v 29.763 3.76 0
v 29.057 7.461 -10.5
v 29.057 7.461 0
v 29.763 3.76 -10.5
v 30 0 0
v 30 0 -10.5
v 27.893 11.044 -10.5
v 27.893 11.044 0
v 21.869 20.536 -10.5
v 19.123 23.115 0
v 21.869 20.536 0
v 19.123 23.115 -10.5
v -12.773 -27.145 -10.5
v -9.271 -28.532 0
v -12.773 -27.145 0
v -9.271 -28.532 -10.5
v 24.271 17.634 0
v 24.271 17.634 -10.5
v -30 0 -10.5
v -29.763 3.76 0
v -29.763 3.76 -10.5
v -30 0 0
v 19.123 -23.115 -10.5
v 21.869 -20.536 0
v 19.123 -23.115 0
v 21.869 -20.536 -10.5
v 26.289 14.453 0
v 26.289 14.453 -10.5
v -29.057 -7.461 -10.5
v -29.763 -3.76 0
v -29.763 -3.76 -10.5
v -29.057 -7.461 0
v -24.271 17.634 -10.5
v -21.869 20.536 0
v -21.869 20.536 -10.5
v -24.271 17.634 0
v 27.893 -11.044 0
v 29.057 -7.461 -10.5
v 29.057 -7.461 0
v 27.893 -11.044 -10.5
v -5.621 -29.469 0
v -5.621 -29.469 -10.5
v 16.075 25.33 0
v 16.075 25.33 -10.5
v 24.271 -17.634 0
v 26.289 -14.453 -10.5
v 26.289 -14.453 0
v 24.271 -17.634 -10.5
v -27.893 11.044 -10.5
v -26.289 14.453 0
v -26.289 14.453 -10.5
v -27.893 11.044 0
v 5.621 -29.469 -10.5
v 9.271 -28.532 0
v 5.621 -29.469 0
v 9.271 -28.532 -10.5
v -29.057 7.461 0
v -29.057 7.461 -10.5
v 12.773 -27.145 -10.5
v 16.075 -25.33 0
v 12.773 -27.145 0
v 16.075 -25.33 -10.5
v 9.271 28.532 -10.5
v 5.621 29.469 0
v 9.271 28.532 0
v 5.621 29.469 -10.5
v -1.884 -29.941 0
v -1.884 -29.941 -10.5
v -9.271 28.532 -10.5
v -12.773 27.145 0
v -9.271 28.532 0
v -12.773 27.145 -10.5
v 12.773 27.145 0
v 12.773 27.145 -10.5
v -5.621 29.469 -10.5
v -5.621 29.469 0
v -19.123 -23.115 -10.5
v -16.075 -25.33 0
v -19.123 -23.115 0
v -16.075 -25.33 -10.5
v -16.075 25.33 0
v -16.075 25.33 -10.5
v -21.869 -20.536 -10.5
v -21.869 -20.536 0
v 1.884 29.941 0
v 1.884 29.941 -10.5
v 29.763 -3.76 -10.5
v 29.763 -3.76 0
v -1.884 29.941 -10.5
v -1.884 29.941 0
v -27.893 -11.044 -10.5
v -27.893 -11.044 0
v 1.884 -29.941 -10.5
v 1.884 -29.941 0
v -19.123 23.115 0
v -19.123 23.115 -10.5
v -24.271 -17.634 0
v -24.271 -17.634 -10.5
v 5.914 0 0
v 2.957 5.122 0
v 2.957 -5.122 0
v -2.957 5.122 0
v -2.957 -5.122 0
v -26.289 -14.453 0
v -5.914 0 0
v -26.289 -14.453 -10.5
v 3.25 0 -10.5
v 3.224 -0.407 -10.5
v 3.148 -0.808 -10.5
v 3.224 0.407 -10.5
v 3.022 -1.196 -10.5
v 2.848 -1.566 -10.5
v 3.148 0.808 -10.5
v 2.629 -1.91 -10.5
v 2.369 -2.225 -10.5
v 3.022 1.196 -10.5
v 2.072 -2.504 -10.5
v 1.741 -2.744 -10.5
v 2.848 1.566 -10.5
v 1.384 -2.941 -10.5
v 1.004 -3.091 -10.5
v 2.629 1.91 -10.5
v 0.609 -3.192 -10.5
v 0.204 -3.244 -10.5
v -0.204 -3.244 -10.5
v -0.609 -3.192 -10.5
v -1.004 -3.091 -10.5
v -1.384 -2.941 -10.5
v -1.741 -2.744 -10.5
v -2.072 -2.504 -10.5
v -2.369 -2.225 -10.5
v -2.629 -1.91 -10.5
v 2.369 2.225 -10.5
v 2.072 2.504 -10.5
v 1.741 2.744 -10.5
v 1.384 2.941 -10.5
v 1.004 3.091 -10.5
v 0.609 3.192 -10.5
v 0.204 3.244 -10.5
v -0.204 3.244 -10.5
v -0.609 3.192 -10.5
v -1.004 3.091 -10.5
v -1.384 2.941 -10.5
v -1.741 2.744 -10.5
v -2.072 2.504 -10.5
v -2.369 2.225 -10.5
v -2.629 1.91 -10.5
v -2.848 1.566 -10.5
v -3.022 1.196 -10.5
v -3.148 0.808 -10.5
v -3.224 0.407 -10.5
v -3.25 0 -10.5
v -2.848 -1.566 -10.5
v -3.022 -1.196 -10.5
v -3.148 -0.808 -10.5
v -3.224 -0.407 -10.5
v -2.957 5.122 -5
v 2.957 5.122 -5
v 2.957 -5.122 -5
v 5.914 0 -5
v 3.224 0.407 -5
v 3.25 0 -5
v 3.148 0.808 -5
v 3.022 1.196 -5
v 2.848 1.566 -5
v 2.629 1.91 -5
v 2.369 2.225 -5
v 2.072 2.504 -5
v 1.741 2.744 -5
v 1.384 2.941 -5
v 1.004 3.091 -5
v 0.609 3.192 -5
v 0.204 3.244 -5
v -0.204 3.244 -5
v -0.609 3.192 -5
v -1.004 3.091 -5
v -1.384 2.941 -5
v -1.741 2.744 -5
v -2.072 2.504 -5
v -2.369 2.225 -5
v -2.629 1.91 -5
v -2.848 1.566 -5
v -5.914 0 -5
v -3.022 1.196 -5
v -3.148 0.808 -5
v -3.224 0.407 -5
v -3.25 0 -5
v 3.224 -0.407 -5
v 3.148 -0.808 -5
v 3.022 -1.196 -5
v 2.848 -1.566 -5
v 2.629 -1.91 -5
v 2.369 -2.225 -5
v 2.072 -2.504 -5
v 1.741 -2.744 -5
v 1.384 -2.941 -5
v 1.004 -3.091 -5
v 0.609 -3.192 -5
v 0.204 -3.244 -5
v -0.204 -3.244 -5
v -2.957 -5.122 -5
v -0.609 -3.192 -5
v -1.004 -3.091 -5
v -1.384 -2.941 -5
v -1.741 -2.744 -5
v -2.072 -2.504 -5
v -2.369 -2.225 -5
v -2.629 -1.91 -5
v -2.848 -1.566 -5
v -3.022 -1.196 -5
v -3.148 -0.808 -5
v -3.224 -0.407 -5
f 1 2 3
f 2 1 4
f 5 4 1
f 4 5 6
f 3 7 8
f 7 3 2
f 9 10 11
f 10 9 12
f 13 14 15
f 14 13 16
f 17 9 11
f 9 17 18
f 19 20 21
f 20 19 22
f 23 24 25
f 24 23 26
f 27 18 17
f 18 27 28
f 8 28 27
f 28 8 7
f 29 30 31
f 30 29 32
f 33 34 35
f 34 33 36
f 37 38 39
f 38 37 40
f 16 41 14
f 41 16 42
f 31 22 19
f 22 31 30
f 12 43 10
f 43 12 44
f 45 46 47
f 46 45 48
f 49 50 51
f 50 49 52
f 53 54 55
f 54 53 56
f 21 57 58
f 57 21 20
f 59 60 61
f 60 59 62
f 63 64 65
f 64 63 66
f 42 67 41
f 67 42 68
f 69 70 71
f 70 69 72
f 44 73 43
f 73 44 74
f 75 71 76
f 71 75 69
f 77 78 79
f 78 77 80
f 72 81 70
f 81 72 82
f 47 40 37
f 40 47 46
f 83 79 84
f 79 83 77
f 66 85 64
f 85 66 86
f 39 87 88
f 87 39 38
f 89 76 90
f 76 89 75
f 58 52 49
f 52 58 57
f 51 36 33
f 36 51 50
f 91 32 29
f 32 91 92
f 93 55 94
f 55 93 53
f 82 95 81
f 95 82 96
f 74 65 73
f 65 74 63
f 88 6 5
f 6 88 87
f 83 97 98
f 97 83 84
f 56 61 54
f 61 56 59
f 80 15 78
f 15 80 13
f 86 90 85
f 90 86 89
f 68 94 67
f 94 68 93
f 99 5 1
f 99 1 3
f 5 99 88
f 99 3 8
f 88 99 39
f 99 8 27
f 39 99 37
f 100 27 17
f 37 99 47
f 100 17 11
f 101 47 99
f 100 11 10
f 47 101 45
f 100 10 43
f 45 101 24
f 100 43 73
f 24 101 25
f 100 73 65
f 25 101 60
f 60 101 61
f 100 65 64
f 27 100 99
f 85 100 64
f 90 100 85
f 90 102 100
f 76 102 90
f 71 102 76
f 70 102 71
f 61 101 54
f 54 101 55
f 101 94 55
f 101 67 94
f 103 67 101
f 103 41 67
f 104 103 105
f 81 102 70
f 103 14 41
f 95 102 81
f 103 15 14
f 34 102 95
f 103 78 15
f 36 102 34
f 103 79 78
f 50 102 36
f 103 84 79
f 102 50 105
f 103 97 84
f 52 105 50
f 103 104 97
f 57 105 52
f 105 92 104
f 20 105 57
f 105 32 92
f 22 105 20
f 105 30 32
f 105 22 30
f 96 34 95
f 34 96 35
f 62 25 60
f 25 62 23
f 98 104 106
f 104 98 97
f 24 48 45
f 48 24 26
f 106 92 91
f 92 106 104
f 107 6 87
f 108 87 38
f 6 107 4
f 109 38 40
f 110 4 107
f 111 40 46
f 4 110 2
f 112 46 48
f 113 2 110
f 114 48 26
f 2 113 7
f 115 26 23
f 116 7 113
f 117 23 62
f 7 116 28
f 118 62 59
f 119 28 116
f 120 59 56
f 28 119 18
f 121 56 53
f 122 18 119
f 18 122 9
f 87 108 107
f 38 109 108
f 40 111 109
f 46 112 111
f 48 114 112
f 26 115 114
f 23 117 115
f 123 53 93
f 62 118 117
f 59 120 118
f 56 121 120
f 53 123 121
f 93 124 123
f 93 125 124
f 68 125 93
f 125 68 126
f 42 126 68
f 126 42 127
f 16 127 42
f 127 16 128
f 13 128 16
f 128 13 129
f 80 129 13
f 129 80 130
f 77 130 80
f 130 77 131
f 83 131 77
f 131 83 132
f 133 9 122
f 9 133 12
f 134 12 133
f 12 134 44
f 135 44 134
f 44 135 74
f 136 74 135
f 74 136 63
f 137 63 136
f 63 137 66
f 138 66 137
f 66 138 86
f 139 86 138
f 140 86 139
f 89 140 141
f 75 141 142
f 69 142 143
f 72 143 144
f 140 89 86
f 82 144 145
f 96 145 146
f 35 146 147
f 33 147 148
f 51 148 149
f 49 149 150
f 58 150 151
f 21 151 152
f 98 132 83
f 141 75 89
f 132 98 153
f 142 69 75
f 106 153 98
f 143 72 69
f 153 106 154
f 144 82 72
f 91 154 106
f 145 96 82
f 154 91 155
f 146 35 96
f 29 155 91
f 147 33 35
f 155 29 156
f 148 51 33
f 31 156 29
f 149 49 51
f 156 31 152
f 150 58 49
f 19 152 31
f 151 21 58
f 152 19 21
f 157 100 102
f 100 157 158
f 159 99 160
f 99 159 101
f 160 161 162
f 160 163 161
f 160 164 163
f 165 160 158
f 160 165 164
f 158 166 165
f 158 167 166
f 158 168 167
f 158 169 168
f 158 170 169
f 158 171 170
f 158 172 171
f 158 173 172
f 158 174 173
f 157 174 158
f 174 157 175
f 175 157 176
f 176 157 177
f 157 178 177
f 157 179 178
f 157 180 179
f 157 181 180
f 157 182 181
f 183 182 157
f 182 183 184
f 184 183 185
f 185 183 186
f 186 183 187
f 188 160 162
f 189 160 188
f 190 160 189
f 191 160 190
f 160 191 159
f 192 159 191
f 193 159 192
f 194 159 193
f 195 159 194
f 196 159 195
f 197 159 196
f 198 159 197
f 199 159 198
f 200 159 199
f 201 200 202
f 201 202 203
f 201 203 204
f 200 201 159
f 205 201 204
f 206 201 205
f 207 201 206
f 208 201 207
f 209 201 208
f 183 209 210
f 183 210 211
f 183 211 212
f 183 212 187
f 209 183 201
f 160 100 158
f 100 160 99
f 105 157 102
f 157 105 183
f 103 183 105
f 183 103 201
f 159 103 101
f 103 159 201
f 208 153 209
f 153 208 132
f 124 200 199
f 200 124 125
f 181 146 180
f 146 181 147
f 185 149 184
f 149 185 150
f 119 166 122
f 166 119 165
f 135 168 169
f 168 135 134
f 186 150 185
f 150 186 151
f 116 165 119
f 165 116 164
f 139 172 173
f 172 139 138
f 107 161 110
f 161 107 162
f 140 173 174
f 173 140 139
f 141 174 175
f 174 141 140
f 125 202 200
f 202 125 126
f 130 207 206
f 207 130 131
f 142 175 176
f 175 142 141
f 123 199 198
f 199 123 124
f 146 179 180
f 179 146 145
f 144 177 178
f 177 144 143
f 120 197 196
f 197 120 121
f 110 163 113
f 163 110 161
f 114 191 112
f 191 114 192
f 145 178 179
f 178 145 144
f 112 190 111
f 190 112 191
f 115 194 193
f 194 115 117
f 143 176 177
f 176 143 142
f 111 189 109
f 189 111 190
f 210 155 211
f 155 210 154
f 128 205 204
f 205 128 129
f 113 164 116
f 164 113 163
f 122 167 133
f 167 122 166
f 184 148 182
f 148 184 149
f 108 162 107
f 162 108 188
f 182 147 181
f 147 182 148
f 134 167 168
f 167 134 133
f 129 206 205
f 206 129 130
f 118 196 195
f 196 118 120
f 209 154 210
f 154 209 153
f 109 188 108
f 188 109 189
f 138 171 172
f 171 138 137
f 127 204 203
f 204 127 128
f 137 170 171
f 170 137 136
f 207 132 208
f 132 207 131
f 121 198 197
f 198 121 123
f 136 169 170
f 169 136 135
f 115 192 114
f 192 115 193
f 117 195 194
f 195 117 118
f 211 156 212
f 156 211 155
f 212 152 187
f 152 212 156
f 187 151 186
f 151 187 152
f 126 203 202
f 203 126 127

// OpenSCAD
$fn = 50;


difference() {
	union() {
		translate(v = [0, 0, -10.5000000000]) {
			cylinder(h = 10.5000000000, r = 30.0000000000);
		}
		translate(v = [0, 0, -9.0000000000]) {
			cylinder(h = 9, r = 2.8750000000);
		}
	}
	union() {
		translate(v = [0, 0, 0]) {
			rotate(a = [0, 0, 0]) {
				difference() {
					union() {
						translate(v = [0, 0, -5]) {
							linear_extrude(height = 5) {
								polygon(points = [[5.9142500000, 0.0000000000], [2.9571250000, 5.1218907443], [-2.9571250000, 5.1218907443], [-5.9142500000, 0.0000000000], [-2.9571250000, -5.1218907443], [2.9571250000, -5.1218907443]]);
							}
						}
					}
					union();
				}
			}
		}
		#translate(v = [0, 0, -100.0000000000]) {
			cylinder(h = 200, r = 3.2500000000);
		}
	}
}
